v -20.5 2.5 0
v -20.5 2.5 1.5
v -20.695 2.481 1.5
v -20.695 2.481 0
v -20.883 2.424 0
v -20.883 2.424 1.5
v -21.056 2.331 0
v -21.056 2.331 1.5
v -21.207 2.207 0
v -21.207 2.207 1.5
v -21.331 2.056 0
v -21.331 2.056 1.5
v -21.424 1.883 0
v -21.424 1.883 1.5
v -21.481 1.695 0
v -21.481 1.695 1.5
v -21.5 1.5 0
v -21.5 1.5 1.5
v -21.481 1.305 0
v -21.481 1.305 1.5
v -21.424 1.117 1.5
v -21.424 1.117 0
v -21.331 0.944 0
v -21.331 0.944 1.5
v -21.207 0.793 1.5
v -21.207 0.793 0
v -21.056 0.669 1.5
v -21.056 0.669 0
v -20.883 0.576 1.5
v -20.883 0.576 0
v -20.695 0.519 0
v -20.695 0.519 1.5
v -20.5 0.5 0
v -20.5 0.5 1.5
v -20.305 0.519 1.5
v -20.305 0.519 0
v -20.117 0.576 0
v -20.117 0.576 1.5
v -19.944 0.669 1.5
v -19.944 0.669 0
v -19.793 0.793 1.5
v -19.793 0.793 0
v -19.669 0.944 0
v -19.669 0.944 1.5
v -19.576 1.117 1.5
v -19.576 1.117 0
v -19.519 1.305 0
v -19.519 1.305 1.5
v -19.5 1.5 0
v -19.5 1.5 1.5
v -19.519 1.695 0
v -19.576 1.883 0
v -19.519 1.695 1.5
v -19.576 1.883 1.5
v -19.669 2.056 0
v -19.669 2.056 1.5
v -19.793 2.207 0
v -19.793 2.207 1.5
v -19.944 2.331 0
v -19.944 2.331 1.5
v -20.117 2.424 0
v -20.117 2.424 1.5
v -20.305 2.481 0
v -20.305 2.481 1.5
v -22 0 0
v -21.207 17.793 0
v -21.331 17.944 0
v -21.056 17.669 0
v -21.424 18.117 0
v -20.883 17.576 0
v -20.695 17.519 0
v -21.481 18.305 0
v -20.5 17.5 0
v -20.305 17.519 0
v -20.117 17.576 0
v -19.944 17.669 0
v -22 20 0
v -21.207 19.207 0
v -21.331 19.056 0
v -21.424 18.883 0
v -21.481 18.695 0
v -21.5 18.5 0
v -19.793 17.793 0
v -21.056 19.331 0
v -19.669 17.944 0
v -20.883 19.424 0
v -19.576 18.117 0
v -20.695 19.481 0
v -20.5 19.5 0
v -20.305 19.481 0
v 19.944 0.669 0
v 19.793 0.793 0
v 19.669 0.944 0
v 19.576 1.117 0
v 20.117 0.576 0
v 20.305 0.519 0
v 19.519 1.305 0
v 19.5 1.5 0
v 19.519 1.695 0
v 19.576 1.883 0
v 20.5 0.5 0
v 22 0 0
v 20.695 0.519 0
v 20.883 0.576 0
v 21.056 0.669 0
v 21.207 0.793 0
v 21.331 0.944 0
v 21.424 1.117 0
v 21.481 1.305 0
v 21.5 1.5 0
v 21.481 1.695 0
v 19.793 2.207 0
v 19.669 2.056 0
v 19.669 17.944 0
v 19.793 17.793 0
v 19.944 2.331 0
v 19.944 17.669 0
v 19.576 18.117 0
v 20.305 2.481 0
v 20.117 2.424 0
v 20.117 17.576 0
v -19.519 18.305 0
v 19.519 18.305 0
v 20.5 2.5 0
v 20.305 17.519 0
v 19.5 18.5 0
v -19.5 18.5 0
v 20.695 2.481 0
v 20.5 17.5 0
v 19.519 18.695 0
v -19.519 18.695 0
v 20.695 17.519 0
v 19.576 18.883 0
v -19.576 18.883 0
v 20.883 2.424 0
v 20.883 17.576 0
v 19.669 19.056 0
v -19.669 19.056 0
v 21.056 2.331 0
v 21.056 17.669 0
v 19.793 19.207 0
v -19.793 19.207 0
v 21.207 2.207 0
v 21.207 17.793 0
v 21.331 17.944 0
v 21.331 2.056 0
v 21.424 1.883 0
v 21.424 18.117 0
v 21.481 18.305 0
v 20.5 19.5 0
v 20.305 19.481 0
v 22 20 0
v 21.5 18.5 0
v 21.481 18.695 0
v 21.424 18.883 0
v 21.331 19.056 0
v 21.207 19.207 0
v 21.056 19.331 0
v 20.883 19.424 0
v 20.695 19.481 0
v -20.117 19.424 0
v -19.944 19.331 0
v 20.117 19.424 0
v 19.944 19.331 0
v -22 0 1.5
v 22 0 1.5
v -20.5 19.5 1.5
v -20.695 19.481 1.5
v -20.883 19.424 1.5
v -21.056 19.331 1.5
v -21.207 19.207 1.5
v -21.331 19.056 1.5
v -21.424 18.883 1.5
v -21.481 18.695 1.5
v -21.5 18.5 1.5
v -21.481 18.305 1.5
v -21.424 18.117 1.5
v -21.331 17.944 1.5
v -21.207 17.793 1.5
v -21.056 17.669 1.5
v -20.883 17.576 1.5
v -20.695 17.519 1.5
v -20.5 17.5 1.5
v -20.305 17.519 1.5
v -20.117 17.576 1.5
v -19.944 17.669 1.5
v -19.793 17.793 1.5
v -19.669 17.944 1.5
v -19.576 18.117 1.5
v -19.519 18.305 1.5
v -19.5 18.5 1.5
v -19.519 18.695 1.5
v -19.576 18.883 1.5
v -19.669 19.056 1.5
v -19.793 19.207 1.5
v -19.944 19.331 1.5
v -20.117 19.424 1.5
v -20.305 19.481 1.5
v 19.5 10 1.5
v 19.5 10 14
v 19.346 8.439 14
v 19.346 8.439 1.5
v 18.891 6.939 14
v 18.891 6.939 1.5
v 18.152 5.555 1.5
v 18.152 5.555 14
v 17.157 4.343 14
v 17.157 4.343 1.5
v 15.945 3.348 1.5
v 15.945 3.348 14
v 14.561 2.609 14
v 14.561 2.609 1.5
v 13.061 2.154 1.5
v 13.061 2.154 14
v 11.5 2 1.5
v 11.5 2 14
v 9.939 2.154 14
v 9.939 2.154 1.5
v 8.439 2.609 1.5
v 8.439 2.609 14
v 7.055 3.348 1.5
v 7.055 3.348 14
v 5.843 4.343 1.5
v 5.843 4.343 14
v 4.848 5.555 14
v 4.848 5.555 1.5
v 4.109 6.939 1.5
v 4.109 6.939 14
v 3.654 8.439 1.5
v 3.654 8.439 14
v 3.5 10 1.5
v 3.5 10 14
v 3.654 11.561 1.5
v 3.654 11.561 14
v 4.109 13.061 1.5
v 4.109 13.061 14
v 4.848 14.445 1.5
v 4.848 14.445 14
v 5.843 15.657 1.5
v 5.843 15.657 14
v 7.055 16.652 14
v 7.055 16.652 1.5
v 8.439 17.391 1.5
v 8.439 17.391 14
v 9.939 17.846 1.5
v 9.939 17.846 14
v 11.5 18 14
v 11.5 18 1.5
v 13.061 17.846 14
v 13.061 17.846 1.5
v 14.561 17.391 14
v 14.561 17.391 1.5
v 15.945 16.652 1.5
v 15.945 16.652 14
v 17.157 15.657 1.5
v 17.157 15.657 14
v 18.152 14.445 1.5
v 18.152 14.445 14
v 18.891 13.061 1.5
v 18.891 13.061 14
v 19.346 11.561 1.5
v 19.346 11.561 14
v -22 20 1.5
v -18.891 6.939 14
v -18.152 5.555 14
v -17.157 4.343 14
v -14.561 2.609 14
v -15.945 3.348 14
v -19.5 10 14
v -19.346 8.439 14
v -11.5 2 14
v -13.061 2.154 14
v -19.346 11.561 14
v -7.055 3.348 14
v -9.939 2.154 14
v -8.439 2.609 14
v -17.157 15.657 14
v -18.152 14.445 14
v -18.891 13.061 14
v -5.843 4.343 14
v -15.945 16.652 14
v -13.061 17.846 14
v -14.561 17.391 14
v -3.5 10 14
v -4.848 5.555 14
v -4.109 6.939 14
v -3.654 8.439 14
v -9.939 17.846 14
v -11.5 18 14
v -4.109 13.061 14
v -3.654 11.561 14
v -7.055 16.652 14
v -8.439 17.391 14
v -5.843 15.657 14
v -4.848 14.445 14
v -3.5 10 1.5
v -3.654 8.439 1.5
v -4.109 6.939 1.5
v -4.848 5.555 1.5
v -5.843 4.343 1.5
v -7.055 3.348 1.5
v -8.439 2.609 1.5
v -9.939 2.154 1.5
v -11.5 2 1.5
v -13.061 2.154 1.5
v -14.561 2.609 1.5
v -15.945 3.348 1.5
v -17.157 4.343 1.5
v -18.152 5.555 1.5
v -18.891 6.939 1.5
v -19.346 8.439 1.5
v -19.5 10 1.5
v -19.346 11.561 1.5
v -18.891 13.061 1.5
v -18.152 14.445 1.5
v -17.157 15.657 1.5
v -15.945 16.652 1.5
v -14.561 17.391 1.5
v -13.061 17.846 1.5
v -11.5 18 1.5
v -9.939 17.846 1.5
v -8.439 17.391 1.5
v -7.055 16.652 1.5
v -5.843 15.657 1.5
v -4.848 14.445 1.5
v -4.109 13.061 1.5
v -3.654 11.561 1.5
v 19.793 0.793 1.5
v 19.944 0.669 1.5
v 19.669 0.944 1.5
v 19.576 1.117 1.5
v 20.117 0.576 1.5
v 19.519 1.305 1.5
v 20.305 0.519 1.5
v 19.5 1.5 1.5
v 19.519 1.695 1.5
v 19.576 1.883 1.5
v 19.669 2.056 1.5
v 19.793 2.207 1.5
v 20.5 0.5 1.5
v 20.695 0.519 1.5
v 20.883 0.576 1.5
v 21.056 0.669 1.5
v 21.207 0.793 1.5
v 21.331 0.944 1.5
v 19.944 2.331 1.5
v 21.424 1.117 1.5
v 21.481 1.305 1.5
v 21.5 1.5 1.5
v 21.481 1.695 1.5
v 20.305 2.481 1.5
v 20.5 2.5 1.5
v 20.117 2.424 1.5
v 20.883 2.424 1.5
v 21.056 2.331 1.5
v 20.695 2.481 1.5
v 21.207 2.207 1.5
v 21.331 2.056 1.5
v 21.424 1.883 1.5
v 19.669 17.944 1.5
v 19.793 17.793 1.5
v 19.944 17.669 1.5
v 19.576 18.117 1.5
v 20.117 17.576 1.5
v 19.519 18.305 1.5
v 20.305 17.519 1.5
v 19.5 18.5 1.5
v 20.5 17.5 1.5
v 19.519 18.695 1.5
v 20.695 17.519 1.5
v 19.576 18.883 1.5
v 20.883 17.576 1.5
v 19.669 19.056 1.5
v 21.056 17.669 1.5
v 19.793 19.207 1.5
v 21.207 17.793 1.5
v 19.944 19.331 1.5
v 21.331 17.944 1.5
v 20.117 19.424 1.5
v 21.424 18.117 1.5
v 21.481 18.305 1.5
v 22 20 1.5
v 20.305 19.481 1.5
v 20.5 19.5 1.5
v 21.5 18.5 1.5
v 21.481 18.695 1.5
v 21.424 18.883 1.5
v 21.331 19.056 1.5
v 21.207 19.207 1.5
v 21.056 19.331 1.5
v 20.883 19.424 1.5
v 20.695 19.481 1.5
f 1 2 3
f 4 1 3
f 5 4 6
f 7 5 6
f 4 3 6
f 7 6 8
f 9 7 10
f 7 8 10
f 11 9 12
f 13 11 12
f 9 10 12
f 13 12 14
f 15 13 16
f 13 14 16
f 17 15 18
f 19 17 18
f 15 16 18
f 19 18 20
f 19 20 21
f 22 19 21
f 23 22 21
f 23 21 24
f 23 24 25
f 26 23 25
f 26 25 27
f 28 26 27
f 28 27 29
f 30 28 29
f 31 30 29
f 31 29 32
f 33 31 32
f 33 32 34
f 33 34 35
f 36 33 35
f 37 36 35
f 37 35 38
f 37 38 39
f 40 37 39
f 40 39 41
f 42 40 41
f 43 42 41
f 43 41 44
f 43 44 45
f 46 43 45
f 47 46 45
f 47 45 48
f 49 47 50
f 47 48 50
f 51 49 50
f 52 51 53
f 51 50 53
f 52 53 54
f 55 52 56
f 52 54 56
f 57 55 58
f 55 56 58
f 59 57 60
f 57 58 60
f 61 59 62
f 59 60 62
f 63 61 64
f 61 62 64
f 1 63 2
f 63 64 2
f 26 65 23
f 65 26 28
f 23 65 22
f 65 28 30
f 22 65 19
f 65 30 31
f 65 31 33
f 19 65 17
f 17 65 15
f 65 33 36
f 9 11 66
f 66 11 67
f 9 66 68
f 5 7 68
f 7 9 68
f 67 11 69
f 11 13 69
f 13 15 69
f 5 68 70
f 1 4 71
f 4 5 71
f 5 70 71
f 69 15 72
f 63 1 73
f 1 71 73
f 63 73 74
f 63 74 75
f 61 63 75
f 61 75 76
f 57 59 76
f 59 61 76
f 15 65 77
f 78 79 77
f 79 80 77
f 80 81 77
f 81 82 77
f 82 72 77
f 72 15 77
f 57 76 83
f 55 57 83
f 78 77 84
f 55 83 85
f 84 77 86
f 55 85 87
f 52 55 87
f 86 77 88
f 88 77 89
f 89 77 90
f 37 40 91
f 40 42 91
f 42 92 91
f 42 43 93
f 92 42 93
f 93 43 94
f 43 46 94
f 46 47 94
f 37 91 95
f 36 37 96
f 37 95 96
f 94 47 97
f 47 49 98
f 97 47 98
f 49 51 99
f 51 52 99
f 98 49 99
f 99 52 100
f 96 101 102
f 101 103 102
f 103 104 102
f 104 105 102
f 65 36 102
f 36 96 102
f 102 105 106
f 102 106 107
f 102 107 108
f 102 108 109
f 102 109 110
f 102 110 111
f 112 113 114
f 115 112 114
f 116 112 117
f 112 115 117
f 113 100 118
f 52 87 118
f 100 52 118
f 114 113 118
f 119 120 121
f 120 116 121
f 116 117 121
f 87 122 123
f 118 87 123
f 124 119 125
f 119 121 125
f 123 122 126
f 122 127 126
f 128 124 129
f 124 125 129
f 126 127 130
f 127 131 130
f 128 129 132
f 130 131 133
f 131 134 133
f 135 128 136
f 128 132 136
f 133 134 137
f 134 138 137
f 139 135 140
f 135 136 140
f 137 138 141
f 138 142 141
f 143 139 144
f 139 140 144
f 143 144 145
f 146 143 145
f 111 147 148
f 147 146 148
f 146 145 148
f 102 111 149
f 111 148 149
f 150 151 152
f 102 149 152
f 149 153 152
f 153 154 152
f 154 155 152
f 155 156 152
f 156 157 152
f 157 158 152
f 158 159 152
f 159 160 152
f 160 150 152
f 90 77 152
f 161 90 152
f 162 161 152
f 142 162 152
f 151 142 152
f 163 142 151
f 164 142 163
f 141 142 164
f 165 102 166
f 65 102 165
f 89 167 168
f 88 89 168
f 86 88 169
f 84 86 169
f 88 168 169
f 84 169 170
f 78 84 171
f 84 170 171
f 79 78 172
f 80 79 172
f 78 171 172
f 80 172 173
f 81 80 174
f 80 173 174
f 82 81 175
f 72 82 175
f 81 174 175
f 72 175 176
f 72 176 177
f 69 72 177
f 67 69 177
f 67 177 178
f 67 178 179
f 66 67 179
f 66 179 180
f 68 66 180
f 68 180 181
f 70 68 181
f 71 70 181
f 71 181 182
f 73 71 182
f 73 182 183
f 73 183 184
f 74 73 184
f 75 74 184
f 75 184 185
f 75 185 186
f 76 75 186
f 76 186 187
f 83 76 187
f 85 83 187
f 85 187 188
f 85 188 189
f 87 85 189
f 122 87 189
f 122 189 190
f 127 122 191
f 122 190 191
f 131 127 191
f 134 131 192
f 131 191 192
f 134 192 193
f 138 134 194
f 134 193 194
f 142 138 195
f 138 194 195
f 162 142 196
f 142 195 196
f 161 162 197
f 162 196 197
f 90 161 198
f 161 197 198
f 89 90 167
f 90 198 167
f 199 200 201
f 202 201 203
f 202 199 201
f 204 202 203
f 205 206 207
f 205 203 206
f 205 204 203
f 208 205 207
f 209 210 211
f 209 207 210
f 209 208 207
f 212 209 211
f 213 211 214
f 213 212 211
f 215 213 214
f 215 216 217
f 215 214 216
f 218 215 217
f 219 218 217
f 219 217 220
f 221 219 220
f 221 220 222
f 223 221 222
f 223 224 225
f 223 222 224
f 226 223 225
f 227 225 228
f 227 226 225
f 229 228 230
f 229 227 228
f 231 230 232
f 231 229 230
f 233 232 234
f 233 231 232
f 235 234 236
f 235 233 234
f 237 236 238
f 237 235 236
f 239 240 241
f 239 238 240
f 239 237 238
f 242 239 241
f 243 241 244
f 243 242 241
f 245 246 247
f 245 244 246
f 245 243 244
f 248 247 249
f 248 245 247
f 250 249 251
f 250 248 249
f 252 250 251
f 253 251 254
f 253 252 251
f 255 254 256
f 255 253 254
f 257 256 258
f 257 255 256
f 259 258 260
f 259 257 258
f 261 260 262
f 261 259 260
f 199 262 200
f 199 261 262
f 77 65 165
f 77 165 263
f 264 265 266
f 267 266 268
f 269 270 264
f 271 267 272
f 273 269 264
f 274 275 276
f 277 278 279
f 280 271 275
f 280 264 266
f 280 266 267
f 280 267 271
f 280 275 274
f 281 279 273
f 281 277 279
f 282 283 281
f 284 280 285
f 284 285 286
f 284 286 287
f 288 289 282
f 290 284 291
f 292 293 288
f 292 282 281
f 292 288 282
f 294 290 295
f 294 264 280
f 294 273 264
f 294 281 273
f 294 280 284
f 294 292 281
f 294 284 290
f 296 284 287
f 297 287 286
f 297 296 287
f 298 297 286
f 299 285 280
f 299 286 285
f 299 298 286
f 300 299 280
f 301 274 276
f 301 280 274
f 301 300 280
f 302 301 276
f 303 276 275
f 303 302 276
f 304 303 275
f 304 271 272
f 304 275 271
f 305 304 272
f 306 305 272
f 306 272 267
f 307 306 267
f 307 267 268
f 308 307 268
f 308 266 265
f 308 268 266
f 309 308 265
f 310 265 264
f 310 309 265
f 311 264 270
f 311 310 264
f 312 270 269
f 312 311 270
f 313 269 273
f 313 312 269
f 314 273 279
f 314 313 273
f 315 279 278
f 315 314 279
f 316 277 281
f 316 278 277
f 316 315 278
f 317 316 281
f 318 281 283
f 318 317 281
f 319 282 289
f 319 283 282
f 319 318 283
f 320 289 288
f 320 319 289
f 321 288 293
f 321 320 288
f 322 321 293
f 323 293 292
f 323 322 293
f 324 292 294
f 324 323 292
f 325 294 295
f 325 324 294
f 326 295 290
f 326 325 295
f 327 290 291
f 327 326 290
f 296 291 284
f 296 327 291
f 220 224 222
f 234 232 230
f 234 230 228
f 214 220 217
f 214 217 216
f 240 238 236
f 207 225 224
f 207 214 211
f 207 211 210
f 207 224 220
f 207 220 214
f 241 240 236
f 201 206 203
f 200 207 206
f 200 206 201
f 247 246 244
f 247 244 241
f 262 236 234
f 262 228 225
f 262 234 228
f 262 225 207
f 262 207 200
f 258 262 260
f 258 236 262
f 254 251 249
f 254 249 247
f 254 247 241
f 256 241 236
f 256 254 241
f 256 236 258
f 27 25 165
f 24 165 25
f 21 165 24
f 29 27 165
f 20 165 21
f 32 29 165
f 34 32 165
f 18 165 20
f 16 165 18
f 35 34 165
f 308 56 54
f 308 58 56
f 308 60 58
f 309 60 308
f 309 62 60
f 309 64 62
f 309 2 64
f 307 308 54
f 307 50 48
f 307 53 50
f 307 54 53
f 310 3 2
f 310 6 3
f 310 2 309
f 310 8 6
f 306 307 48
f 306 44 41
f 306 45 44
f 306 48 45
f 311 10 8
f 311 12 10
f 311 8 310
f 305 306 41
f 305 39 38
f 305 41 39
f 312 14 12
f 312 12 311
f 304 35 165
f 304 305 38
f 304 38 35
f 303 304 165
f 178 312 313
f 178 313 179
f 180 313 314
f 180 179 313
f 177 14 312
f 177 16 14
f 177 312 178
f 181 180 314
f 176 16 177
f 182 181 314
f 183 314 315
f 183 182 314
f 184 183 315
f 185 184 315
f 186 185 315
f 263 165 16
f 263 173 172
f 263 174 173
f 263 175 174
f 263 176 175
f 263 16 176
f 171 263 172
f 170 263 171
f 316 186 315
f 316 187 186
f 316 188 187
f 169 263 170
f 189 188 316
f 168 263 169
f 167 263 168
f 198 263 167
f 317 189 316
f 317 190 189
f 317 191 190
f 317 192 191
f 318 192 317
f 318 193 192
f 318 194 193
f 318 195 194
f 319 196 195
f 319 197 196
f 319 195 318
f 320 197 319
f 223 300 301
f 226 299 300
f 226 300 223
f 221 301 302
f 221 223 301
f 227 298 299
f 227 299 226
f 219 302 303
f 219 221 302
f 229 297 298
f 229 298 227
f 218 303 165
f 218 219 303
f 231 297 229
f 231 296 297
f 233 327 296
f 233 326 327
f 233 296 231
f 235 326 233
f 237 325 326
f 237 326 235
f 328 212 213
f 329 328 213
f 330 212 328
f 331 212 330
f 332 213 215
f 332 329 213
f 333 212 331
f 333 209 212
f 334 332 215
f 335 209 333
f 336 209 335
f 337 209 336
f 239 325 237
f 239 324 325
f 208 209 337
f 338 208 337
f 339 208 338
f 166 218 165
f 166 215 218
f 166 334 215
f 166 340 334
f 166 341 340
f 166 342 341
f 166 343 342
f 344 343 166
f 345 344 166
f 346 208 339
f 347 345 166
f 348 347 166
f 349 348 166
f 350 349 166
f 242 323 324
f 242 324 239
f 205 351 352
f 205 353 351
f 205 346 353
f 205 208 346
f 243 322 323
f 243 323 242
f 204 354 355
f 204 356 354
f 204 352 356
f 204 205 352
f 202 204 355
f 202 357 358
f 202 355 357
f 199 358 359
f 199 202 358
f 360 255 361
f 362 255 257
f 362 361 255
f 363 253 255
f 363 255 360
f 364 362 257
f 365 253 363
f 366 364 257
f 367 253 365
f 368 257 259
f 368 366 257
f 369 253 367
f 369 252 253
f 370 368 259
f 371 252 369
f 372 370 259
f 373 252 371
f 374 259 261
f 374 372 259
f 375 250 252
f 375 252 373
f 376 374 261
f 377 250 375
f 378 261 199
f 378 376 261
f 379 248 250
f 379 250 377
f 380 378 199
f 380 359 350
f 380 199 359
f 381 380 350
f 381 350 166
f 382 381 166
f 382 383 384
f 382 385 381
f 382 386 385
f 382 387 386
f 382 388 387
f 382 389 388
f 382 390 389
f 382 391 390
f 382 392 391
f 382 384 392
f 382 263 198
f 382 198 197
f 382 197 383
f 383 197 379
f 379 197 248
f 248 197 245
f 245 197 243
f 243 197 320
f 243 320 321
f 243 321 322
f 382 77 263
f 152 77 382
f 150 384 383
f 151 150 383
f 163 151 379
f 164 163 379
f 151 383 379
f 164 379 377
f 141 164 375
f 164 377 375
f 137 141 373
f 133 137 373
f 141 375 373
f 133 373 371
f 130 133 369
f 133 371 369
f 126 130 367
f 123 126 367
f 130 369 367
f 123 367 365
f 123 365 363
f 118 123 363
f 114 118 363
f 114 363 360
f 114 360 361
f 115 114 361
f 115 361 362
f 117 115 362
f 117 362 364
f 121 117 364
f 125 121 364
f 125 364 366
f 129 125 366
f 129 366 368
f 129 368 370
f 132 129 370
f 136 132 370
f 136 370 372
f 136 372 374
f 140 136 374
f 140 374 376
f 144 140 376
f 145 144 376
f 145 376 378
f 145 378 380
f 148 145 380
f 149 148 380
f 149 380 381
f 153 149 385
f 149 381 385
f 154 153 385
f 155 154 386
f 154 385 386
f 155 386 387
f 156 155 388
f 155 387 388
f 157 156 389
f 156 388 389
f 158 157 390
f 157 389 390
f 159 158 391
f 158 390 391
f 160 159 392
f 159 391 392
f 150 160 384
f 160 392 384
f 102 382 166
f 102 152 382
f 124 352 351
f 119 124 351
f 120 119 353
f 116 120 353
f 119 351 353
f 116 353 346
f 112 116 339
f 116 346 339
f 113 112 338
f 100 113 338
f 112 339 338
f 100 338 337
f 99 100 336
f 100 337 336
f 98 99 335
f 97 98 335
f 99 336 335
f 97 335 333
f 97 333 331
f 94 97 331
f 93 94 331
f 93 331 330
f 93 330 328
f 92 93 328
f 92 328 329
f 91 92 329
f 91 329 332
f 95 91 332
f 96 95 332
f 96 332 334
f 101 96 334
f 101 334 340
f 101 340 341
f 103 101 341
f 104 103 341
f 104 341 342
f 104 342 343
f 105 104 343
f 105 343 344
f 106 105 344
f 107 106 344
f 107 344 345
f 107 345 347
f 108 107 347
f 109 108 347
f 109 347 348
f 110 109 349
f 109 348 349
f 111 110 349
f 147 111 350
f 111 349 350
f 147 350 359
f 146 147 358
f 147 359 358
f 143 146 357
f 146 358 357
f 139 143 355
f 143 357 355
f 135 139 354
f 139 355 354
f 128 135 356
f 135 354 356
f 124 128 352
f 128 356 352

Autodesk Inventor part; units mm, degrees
ref_plane "YZ Plane" through (0, 0, 0) normal (1, 0, 0) x (0, 1, 0)
ref_plane "XZ Plane" through (0, 0, 0) normal (0, 1, 0) x (-1, 0, 0)
ref_plane "XY Plane" through (0, 0, 0) normal (0, 0, 1) x (1, 0, 0)
sketch "Sketch1" plane through (0, 0, 0) normal (0, 0, 1) x (1, 0, 0)
  line L0 (-22, 20) -> (22, 20)
  line L1 (22, 20) -> (22, 0)
  line L2 (22, 0) -> (-22, 0)
  line L3 (-22, 0) -> (-22, 20)
  line L4 (-22, 20) -> (22, 0) construction
  line L5 (22, 20) -> (-22, 0) construction
  point P0 (0, 0)
  point P1 (0, 10)
  point P2 (0, 10)
  dimension "d0" = 44
  dimension "d1" = 20
extrude "Extrusion1" add sketch "Sketch1" along normal blind 1.5
sketch "Sketch2" plane through (0, 0, 1.5) normal (0, 0, 1) x (1, 0, 0)
  circle A0 centre (-11.5, 10) radius 8
  line L0 (0, -4) -> (0, 24) projected
  circle A1 centre (11.5, 10) radius 8
  line L1 (-22, 20) -> (-22, 0) projected
  point P0 (0, 0)
  point P1 (-22, 10)
  point P2 (-19.5, 10)
  dimension "d4" = 16
  dimension "d5" = 2.5
extrude "Extrusion2" add sketch "Sketch2" along normal blind 12.5
sketch "Sketch3" plane through (0, 0, 0) normal (0, 0, -1) x (-1, 0, 0)
  line L0 (21.5, 19.5) -> (-21.5, 19.5)
  line L1 (-21.5, 19.5) -> (-21.5, 0.5)
  line L2 (-21.5, 0.5) -> (21.5, 0.5)
  line L3 (21.5, 0.5) -> (21.5, 19.5)
  line L4 (21.5, 19.5) -> (-21.5, 0.5) construction
  line L5 (-21.5, 19.5) -> (21.5, 0.5) construction
  line L6 (-22, 0) -> (-22, 20) projected
  line L7 (-22, 20) -> (22, 20) projected
  line L8 (22, 20) -> (22, 0) projected
  line L9 (22, 0) -> (-22, 0) projected
  circle A0 centre (-20.5, 18.5) radius 1
  circle A1 centre (-20.5, 1.5) radius 1
  circle A2 centre (20.5, 18.5) radius 1
  circle A3 centre (20.5, 1.5) radius 1
  point P0 (0, 0)
  point P1 (0, 10)
  dimension "d8" = 0.5
  dimension "d9" = 0.5
  dimension "d10" = 0.5
  dimension "d11" = 0.5
  dimension "d12" = 2
  dimension "d13" = 2
  dimension "d14" = 2
  dimension "d15" = 2
hole "Hole1" at (-20.5, 1.5, 0) at (-20.5, 18.5, 0) at (20.5, 1.5, 0) at (20.5, 18.5, 0) direction (0, 0, 1) diameter 2 depth 6
equation "\"d10\" = d8"
equation "\"d11\" = d9"
equation "\"d13\" = d14"
equation "\"d14\" = d12"
equation "\"d15\" = d12"
equation "\"d16\" = d12"
properties part number "US-015"
